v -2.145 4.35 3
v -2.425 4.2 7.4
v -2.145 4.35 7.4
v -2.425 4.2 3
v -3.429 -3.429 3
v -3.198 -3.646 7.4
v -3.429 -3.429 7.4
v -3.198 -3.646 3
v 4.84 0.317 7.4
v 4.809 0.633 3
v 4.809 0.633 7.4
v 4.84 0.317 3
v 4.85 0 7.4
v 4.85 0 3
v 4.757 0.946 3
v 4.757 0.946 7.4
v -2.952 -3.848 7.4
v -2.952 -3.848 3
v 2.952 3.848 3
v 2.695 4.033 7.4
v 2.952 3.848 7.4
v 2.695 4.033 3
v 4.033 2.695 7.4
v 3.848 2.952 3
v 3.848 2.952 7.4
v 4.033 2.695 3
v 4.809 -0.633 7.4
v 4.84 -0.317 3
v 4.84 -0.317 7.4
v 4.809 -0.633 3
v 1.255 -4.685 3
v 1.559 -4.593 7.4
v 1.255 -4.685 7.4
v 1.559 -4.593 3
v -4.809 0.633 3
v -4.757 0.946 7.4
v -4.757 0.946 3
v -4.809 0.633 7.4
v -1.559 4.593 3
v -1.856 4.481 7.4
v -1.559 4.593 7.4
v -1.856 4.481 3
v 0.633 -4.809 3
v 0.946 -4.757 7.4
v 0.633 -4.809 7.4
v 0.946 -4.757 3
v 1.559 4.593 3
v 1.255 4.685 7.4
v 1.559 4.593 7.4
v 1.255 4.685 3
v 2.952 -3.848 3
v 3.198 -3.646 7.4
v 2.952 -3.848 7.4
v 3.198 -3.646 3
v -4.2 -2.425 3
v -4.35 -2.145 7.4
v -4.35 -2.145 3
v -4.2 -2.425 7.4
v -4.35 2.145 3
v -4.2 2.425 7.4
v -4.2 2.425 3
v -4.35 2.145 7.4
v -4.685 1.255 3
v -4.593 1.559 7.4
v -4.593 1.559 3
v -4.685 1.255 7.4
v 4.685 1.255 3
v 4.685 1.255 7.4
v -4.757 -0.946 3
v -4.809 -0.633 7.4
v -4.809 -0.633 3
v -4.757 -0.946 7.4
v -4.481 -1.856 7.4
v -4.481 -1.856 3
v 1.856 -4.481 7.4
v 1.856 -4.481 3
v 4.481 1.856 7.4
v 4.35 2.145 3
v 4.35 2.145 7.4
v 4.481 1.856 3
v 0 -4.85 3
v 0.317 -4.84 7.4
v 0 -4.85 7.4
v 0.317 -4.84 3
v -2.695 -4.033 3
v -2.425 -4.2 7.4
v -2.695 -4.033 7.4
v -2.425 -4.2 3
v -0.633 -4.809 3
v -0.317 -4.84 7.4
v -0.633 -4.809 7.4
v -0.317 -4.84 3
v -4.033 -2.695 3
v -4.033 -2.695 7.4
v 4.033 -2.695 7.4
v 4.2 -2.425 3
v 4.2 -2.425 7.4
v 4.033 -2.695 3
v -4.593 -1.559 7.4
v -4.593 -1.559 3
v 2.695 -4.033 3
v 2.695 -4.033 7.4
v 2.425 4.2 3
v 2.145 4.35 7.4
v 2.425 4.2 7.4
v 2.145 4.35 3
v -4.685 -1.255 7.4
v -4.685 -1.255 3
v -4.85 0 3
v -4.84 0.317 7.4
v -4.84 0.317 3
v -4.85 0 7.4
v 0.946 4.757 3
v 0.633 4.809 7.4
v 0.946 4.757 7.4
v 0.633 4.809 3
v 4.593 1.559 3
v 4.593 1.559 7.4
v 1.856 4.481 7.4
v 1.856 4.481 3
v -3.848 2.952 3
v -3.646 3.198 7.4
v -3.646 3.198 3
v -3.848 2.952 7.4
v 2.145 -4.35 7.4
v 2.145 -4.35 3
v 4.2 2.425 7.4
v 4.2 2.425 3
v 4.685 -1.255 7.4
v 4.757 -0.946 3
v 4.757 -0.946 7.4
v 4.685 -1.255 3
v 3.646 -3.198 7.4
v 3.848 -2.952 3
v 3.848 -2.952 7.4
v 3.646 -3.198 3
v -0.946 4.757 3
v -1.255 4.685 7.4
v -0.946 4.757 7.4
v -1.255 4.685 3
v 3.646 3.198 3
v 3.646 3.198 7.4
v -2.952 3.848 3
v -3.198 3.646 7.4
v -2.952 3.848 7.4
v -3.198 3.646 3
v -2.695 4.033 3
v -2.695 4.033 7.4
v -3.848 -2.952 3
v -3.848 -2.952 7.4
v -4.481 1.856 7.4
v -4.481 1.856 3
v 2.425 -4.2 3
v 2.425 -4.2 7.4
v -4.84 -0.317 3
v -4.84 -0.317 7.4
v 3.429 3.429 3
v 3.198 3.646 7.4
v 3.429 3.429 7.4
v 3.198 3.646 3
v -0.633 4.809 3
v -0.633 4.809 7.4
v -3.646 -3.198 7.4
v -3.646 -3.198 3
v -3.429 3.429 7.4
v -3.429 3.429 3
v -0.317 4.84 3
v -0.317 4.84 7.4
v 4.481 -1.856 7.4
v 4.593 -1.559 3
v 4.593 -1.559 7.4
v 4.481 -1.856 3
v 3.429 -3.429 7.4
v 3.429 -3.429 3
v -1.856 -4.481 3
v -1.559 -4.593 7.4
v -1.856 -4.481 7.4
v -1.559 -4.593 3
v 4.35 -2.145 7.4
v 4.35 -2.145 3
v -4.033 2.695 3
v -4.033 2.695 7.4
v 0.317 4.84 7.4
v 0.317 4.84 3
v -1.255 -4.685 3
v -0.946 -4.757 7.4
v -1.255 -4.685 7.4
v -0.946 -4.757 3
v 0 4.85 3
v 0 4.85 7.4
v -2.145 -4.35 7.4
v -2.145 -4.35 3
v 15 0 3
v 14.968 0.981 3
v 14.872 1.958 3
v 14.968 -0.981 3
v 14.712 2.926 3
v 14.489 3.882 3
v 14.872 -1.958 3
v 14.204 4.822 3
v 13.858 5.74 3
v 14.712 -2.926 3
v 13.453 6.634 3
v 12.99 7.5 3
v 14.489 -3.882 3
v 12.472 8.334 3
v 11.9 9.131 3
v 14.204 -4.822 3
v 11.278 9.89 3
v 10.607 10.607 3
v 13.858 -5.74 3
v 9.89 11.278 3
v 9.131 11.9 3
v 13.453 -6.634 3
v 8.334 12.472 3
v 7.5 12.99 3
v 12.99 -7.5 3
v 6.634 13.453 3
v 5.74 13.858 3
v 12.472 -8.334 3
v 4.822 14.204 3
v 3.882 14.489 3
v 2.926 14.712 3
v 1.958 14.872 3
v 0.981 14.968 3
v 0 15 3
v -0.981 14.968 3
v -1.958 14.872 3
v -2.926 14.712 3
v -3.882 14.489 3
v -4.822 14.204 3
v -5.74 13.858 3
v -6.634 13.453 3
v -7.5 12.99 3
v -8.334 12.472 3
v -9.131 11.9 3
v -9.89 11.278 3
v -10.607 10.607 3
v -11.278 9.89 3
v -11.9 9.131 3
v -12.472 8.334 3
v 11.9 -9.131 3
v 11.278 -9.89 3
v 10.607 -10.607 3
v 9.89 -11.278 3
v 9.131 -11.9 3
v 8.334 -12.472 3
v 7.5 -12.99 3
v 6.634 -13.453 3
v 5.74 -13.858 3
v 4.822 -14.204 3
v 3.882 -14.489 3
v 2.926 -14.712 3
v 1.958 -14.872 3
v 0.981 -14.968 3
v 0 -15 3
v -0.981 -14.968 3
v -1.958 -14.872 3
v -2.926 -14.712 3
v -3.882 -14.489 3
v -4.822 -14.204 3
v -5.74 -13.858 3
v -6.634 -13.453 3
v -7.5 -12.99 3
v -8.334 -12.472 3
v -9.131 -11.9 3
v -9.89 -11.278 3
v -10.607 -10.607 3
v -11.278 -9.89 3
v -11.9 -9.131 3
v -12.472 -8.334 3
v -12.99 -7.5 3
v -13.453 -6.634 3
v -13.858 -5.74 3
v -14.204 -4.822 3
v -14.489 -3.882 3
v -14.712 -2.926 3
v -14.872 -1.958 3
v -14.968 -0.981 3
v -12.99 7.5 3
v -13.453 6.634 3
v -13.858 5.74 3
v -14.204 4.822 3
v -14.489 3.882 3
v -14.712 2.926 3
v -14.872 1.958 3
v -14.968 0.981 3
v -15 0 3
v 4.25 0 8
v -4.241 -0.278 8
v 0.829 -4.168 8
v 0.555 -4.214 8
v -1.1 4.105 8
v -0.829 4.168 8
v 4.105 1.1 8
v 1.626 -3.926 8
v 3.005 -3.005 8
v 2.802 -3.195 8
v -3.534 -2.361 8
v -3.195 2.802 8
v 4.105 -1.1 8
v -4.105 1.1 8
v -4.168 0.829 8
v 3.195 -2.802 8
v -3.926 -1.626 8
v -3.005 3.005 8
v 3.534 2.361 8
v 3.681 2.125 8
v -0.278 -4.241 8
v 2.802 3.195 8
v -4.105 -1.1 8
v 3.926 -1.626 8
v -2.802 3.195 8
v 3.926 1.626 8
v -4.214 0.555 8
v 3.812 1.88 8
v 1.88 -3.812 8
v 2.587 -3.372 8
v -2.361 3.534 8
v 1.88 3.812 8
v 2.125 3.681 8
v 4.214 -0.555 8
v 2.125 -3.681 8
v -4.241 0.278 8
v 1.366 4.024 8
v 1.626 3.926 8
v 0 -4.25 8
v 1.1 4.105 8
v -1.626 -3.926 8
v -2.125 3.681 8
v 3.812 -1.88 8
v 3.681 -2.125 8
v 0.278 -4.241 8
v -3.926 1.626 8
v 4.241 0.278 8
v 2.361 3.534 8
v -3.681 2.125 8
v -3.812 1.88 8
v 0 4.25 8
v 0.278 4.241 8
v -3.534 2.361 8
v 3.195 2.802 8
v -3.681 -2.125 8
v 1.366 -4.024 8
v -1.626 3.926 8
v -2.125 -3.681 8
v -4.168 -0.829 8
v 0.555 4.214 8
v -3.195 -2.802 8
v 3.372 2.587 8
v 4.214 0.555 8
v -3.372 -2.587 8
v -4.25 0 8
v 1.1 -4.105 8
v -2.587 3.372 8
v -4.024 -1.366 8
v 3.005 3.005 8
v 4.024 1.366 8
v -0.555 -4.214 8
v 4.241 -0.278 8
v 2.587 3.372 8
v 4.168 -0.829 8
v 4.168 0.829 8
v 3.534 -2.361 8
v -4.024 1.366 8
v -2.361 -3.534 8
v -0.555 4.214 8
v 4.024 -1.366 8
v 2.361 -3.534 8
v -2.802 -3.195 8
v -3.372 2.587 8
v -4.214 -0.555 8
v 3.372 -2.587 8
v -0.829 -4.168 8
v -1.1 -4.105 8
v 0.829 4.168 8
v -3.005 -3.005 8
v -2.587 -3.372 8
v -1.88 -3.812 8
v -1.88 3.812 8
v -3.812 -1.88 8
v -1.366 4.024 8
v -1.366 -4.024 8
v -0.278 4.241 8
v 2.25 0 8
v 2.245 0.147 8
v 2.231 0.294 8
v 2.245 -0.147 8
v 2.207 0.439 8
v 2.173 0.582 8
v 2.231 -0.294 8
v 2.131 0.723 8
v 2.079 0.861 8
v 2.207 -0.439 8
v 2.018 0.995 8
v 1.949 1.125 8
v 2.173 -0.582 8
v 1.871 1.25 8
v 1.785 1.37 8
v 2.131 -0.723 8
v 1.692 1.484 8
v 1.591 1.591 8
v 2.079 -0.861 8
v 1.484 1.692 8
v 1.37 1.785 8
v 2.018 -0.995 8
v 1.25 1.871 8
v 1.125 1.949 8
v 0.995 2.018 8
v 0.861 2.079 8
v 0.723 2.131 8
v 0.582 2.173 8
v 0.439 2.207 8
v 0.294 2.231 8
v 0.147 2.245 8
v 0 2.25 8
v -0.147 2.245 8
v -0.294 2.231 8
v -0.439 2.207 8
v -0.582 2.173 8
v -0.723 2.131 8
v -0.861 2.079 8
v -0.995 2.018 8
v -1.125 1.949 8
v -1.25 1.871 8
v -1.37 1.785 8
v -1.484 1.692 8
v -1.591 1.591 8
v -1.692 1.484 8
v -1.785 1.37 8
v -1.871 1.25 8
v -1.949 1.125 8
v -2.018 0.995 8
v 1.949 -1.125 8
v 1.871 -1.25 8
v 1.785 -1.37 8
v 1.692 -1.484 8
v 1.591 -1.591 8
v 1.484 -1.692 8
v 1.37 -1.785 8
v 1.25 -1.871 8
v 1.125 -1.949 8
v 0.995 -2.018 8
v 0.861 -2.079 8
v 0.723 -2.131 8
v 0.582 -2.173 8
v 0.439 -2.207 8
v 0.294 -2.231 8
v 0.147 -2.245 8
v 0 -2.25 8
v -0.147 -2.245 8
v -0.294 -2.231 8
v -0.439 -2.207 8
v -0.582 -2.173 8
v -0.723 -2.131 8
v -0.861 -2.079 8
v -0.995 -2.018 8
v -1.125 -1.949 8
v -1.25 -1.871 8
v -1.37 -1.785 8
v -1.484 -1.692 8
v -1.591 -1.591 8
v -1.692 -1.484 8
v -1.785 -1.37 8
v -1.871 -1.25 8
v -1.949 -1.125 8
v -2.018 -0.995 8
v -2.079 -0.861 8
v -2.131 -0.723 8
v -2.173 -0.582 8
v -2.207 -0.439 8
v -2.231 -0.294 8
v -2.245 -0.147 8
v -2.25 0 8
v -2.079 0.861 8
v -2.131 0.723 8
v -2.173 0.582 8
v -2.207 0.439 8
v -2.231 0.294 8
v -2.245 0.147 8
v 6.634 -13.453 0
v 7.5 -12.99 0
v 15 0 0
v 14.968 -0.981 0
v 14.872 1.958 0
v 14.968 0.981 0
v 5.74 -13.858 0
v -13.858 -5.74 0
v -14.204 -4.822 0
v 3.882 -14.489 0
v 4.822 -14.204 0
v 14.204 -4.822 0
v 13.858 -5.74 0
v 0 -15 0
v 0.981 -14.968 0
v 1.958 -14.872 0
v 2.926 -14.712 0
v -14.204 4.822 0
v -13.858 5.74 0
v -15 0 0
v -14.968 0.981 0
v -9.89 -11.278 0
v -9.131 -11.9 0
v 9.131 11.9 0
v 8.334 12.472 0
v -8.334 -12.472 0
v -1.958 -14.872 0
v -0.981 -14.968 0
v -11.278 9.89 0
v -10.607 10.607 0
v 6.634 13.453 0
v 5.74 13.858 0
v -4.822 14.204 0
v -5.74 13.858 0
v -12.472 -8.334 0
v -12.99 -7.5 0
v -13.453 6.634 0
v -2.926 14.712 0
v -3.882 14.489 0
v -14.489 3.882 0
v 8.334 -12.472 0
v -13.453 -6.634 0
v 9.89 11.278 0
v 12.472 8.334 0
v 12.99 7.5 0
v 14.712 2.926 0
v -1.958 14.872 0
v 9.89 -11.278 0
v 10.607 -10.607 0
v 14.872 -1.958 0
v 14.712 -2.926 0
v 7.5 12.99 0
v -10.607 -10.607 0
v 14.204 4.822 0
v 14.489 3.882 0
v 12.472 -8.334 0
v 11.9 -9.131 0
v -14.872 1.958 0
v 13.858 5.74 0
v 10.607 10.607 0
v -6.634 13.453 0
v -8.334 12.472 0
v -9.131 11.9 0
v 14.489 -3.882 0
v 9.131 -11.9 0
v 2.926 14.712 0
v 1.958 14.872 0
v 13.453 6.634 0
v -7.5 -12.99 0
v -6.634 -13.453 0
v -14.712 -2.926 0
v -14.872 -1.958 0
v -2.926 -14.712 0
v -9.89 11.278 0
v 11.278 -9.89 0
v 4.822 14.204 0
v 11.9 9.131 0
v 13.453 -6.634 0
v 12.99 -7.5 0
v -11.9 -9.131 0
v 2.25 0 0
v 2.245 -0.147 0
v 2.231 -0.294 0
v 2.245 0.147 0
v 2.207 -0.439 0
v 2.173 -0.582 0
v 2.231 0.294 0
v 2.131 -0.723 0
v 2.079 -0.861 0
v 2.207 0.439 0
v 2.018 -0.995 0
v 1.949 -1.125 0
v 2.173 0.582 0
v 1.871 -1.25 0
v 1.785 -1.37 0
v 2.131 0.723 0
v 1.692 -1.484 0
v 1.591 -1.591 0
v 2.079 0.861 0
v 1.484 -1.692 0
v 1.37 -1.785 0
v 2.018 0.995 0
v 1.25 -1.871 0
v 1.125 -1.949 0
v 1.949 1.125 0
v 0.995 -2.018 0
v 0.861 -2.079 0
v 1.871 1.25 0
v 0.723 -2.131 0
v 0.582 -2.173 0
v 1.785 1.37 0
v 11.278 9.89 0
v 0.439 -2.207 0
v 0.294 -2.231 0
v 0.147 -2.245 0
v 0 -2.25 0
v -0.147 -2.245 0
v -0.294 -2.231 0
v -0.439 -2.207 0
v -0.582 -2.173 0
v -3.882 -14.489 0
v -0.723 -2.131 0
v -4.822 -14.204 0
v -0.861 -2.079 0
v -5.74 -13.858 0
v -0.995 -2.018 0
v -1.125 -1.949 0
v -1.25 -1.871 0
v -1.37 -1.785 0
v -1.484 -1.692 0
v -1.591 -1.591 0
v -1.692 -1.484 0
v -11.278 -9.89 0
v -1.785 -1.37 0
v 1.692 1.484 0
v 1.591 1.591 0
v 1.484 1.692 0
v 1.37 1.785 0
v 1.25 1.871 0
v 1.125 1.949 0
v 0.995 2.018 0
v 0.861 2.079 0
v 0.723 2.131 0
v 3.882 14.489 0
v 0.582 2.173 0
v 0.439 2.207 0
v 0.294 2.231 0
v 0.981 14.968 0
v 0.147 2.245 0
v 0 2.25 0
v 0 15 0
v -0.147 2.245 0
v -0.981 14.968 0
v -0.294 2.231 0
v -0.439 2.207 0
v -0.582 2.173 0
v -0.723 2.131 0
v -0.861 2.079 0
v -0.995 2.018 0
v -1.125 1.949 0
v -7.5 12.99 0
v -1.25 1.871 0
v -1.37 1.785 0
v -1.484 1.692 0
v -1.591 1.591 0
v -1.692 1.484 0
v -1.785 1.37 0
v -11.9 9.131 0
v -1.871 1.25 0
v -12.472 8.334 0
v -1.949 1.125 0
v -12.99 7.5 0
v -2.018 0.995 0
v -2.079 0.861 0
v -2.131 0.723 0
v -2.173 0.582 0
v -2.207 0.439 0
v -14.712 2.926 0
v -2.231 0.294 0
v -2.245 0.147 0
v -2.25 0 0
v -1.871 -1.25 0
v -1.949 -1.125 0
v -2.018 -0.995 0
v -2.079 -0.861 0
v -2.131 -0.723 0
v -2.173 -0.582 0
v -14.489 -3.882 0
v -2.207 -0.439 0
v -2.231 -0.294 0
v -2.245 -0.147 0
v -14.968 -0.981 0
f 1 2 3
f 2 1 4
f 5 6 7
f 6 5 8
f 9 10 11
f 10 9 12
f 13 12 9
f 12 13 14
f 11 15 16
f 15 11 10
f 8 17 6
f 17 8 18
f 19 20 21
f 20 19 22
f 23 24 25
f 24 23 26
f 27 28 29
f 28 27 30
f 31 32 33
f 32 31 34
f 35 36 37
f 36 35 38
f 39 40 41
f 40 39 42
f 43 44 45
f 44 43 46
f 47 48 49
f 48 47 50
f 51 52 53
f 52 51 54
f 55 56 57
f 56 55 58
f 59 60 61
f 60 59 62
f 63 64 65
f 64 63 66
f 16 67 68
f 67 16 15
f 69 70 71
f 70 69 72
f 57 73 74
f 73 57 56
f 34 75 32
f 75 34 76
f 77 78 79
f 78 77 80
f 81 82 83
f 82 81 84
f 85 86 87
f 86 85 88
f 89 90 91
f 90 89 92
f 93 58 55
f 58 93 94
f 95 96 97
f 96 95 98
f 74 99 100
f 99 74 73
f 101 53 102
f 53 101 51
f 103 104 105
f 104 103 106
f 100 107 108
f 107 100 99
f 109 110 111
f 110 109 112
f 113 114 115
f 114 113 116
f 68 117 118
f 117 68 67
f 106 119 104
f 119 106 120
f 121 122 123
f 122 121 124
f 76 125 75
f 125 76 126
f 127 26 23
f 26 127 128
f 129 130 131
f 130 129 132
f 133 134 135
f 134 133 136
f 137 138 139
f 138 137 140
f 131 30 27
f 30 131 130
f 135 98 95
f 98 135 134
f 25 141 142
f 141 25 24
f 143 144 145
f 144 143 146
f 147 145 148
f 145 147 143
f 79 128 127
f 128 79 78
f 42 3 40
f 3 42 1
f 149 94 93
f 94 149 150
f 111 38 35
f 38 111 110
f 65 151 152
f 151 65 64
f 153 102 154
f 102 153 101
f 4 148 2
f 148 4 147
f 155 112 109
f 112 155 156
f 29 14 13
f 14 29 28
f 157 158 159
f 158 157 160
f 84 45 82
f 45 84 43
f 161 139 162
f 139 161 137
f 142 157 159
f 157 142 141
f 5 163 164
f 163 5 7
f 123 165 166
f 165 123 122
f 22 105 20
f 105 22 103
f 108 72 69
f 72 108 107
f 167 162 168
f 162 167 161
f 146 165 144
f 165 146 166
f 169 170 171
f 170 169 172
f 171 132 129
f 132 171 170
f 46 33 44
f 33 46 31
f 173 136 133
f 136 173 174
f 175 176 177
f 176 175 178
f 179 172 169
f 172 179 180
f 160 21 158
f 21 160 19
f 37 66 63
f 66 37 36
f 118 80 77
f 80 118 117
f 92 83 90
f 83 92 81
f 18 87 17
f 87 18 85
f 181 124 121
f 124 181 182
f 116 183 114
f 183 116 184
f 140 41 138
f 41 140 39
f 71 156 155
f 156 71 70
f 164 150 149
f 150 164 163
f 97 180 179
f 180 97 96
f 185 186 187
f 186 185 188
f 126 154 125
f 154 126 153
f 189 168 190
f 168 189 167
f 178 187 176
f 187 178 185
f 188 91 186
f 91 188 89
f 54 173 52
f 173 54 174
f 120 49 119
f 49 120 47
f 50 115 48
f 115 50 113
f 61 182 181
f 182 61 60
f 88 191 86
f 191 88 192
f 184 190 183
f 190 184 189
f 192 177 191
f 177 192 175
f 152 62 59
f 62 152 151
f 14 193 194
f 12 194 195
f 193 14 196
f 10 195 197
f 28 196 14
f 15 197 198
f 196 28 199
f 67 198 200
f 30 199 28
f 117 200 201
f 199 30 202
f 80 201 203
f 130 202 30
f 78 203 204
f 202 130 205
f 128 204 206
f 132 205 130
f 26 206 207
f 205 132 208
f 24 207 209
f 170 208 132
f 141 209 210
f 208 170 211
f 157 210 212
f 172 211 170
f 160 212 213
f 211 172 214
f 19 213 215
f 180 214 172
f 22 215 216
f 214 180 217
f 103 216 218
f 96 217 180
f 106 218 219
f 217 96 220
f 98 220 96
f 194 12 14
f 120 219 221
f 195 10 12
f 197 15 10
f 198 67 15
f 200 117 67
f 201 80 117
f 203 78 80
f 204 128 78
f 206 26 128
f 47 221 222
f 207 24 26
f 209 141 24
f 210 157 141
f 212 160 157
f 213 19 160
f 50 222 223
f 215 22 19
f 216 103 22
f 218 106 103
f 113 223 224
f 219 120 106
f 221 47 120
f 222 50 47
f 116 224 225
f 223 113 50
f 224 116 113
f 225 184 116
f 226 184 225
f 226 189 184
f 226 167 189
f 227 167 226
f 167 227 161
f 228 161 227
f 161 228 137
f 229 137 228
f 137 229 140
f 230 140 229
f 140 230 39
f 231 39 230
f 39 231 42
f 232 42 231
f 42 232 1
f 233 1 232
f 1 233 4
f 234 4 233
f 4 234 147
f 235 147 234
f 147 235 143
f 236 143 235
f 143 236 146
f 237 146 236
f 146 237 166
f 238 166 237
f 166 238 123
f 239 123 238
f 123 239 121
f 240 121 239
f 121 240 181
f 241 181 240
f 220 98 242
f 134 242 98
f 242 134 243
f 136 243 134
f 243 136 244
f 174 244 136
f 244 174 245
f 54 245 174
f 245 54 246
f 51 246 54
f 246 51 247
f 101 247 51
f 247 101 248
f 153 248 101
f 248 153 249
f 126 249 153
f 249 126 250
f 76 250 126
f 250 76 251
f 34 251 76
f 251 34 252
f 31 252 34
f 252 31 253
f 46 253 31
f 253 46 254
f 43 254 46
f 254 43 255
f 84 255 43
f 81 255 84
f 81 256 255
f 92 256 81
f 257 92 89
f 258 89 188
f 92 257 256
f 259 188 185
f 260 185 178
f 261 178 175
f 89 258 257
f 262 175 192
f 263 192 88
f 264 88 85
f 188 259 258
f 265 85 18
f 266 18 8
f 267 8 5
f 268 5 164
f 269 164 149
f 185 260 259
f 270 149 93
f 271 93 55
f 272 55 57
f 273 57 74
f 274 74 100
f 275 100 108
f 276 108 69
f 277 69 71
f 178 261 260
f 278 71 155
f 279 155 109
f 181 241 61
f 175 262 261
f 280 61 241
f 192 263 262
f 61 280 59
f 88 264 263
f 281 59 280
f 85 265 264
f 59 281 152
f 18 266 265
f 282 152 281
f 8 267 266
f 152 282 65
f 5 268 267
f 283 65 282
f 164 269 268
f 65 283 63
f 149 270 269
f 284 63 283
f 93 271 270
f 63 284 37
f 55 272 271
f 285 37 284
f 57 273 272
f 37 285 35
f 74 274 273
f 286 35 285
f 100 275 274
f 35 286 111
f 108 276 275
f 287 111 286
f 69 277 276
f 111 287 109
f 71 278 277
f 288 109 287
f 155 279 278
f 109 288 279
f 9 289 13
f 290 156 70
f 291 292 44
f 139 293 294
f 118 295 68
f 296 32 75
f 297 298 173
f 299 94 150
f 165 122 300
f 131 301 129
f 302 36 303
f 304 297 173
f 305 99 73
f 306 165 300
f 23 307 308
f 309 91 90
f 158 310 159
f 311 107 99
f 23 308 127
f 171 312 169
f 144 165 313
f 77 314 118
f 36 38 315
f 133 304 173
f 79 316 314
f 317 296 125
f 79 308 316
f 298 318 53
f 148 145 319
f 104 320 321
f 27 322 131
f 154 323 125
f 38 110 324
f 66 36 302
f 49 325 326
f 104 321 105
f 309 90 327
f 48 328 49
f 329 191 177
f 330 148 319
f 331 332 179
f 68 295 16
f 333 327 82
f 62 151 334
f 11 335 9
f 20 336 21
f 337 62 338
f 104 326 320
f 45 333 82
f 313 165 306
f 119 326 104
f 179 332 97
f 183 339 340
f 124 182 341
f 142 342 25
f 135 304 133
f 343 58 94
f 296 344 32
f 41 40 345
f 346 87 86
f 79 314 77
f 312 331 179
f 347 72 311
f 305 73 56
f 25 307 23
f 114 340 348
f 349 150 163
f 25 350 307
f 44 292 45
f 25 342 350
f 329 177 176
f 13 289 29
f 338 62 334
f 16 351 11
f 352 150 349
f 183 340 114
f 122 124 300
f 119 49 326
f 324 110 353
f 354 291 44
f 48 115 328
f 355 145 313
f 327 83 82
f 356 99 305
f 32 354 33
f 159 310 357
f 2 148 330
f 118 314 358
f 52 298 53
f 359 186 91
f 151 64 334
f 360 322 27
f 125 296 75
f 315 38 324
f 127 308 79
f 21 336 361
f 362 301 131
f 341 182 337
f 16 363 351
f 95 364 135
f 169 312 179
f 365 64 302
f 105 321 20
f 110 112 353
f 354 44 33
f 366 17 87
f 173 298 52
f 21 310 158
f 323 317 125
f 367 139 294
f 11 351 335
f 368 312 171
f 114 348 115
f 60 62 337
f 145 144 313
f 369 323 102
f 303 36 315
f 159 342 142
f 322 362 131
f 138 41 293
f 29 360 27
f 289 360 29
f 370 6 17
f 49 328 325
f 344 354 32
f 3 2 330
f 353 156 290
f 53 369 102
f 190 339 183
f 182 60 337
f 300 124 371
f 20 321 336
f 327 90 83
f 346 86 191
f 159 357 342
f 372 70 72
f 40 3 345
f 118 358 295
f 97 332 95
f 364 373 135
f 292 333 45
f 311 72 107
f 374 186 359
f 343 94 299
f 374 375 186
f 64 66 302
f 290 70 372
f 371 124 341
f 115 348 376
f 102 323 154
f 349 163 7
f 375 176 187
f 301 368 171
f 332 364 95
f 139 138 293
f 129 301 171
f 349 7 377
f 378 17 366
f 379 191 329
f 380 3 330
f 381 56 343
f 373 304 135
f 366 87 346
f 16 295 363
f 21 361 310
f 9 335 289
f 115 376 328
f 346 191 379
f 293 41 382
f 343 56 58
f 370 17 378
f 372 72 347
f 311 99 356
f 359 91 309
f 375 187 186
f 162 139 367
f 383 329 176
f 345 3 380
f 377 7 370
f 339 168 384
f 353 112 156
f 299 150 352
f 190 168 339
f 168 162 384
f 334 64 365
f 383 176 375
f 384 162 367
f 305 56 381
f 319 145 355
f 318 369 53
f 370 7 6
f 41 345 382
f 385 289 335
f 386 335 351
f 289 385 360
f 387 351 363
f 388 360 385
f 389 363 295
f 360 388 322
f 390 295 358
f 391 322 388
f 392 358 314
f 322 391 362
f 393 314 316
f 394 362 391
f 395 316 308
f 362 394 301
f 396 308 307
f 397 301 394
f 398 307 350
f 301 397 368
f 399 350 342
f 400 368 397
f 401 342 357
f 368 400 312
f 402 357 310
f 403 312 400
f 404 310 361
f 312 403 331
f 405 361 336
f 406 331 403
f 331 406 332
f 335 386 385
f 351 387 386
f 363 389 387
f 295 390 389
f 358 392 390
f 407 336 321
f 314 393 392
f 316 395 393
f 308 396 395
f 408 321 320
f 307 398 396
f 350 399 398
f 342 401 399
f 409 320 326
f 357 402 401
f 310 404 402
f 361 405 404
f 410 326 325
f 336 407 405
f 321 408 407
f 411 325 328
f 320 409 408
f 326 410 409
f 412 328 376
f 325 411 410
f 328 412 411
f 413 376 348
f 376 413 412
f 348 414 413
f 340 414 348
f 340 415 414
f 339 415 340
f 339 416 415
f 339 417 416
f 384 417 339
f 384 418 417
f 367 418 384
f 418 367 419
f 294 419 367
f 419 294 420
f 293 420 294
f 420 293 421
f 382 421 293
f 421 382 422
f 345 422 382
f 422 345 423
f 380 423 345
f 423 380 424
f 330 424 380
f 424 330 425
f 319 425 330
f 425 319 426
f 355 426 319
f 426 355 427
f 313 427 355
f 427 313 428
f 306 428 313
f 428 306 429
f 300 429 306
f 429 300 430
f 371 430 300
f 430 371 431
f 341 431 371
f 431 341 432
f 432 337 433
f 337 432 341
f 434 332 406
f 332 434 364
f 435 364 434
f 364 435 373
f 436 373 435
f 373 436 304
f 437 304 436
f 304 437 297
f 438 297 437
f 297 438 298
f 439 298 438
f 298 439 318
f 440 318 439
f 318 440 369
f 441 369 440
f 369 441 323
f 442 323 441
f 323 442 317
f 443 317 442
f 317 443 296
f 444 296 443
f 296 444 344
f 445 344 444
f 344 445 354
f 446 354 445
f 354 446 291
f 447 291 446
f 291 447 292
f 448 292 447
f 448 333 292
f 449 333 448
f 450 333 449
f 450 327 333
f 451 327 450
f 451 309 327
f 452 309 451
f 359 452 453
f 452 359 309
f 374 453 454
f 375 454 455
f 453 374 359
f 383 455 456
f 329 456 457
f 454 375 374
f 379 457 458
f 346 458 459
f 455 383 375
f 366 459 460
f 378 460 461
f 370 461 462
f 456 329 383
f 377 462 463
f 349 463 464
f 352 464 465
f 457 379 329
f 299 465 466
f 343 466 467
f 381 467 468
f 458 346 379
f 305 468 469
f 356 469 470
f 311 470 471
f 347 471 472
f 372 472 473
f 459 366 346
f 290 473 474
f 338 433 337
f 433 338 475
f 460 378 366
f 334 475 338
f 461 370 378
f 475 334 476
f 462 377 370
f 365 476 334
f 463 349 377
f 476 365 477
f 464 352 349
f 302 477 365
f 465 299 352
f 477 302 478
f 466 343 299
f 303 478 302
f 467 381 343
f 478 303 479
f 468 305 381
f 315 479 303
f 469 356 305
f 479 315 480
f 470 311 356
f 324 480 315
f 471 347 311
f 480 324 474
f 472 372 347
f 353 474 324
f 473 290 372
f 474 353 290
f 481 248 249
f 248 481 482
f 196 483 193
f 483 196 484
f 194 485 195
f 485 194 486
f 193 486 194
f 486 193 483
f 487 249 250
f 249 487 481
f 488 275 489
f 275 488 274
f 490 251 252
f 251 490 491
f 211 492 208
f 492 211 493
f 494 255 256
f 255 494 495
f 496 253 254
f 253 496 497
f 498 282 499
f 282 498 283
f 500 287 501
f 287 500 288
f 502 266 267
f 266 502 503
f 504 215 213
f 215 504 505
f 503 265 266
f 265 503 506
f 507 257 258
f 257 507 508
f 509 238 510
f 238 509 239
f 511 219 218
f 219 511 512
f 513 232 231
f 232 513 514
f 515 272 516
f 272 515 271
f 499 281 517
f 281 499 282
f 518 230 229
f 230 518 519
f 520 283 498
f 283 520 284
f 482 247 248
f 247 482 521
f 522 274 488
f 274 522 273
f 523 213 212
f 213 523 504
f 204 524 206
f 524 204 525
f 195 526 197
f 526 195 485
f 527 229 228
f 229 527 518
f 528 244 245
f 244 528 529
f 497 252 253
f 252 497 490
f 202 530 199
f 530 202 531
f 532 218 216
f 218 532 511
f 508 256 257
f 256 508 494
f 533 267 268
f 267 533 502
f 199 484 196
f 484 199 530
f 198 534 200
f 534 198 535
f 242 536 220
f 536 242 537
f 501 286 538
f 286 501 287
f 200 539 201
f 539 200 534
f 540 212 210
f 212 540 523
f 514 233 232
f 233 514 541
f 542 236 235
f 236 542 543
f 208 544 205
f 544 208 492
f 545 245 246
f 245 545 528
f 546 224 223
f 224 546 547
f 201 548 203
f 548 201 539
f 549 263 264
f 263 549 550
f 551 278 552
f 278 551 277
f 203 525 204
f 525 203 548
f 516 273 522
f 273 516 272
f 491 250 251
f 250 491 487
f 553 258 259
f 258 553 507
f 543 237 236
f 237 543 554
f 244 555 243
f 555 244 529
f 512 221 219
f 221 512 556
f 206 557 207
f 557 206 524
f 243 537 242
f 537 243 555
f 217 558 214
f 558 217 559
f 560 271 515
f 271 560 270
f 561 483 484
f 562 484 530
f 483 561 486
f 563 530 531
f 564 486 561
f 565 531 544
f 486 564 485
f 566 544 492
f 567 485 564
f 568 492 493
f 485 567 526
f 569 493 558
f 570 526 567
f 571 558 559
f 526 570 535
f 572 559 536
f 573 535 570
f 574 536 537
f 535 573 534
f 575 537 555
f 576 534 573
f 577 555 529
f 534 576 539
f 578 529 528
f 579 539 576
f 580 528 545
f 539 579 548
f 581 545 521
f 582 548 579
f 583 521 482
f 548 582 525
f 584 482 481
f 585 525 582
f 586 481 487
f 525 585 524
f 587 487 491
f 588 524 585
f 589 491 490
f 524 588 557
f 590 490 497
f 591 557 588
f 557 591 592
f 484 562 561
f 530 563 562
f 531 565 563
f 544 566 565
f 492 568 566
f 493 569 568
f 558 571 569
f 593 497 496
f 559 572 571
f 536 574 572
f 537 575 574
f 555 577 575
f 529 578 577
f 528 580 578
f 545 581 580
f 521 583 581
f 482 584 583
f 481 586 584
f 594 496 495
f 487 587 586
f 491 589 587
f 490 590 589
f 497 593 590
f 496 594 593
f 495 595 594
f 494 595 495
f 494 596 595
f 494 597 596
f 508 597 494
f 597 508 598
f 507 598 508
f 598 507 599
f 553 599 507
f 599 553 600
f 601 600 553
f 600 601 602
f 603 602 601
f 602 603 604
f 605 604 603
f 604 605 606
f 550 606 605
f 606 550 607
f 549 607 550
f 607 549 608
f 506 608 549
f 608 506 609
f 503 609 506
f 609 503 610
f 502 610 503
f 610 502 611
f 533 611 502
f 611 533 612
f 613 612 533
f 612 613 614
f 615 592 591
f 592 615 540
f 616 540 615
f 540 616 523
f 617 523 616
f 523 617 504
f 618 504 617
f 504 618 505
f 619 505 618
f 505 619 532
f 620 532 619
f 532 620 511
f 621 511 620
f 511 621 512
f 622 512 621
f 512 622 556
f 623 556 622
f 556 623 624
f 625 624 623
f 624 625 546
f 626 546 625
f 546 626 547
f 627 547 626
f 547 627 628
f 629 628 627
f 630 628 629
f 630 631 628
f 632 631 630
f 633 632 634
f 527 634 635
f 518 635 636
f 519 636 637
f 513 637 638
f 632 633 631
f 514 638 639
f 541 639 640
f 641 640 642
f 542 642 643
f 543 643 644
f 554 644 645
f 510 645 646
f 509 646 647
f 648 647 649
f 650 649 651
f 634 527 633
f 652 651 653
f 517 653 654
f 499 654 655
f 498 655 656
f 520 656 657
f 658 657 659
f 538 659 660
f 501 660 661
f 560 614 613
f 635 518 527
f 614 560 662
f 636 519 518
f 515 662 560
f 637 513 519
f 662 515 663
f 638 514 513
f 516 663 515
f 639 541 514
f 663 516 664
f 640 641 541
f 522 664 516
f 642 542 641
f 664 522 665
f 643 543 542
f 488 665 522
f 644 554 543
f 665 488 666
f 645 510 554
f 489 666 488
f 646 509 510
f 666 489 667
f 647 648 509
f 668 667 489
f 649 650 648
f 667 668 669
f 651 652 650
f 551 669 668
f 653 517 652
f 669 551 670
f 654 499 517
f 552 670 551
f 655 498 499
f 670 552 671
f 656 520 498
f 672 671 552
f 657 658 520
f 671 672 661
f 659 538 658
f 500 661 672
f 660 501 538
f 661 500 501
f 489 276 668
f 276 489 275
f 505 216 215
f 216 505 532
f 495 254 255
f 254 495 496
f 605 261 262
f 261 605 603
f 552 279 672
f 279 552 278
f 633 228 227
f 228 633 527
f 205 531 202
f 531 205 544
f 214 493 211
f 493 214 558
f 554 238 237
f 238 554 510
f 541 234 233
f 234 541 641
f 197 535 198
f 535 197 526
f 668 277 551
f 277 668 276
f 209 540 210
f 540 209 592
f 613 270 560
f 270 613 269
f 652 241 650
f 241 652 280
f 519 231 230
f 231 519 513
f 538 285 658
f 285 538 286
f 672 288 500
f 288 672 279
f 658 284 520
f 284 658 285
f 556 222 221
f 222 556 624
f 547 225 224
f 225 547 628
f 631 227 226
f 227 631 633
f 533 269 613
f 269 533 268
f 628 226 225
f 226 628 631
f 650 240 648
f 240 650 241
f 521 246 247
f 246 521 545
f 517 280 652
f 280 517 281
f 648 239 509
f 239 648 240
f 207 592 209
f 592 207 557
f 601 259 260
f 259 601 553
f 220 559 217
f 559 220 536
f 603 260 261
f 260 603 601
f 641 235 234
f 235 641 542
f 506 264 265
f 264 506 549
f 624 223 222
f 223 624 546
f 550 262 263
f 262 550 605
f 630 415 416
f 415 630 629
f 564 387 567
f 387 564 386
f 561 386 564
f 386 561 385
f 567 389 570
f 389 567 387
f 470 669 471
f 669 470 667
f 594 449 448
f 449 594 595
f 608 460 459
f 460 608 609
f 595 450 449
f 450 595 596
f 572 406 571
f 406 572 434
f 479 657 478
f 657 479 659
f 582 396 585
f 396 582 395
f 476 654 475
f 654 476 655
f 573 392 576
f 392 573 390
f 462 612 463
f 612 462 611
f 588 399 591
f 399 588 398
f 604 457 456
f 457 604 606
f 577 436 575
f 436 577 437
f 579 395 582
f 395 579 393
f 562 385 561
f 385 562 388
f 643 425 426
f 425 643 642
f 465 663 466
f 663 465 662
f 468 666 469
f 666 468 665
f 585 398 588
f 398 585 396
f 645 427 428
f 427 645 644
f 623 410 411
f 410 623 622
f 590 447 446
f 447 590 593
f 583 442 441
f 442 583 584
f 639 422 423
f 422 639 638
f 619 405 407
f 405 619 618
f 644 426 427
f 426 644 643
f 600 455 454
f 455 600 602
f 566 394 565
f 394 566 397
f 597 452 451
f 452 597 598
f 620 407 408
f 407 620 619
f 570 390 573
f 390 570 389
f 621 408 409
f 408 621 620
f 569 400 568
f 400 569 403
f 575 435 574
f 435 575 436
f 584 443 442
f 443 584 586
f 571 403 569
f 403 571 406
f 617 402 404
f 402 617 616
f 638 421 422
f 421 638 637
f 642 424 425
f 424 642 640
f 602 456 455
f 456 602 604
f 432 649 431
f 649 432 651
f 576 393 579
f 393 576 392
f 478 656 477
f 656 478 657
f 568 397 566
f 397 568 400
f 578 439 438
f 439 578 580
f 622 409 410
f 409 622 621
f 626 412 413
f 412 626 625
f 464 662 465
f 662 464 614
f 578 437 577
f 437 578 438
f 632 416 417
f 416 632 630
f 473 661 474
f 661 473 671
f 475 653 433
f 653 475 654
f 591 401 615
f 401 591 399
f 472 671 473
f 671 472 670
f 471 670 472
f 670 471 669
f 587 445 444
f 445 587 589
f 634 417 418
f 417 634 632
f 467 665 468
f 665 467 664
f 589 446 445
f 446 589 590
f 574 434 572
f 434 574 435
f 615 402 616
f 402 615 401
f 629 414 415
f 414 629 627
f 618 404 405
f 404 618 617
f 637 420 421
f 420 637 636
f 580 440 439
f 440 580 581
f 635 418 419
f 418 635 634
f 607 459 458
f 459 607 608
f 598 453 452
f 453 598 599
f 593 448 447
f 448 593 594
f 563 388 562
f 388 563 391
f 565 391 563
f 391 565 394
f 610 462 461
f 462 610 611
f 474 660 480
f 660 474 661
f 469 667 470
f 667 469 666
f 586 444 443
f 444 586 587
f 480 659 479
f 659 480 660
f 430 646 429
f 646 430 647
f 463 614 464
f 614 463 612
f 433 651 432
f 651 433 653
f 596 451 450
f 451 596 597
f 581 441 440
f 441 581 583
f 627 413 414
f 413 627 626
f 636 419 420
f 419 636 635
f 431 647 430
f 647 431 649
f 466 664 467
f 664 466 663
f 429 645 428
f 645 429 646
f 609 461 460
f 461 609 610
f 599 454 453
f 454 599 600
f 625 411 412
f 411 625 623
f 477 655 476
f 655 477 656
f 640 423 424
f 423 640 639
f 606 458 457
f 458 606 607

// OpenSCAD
// Drive wheel retaining cap: an M4 from the outside clamps the wheel on its
// hex hub.  The spigot enters the hub bore from the outer face; the flange
// bears on the wheel face.  Printed flange-down, spigot up: no supports.
//
// User measurement 2026-11-14: bore ~10 mm, insertion ~5 mm; flange Ø30.

spigot_bore_d = 10.0;    // measured hub bore
spigot_clearance = 0.3;  // diametral running fit for a printed spigot
spigot_len = 5;
flange_d = 30;          // user 2026-11-15: wider bearing face on the wheel
flange_t = 3;
m4_clear = 4.5;
tip_chamfer = 0.6;       // eases the spigot into the bore

$fn = 96;

spigot_d = spigot_bore_d - spigot_clearance;

module wheel_retainer_cap() {
    difference() {
        union() {
            cylinder(d=flange_d, h=flange_t);
            translate([0, 0, flange_t]) {
                cylinder(d=spigot_d, h=spigot_len - tip_chamfer);
                translate([0, 0, spigot_len - tip_chamfer])
                    cylinder(d1=spigot_d, d2=spigot_d - 2*tip_chamfer, h=tip_chamfer);
            }
        }
        translate([0, 0, -1]) cylinder(d=m4_clear, h=flange_t + spigot_len + 2);
    }
}

wheel_retainer_cap();
